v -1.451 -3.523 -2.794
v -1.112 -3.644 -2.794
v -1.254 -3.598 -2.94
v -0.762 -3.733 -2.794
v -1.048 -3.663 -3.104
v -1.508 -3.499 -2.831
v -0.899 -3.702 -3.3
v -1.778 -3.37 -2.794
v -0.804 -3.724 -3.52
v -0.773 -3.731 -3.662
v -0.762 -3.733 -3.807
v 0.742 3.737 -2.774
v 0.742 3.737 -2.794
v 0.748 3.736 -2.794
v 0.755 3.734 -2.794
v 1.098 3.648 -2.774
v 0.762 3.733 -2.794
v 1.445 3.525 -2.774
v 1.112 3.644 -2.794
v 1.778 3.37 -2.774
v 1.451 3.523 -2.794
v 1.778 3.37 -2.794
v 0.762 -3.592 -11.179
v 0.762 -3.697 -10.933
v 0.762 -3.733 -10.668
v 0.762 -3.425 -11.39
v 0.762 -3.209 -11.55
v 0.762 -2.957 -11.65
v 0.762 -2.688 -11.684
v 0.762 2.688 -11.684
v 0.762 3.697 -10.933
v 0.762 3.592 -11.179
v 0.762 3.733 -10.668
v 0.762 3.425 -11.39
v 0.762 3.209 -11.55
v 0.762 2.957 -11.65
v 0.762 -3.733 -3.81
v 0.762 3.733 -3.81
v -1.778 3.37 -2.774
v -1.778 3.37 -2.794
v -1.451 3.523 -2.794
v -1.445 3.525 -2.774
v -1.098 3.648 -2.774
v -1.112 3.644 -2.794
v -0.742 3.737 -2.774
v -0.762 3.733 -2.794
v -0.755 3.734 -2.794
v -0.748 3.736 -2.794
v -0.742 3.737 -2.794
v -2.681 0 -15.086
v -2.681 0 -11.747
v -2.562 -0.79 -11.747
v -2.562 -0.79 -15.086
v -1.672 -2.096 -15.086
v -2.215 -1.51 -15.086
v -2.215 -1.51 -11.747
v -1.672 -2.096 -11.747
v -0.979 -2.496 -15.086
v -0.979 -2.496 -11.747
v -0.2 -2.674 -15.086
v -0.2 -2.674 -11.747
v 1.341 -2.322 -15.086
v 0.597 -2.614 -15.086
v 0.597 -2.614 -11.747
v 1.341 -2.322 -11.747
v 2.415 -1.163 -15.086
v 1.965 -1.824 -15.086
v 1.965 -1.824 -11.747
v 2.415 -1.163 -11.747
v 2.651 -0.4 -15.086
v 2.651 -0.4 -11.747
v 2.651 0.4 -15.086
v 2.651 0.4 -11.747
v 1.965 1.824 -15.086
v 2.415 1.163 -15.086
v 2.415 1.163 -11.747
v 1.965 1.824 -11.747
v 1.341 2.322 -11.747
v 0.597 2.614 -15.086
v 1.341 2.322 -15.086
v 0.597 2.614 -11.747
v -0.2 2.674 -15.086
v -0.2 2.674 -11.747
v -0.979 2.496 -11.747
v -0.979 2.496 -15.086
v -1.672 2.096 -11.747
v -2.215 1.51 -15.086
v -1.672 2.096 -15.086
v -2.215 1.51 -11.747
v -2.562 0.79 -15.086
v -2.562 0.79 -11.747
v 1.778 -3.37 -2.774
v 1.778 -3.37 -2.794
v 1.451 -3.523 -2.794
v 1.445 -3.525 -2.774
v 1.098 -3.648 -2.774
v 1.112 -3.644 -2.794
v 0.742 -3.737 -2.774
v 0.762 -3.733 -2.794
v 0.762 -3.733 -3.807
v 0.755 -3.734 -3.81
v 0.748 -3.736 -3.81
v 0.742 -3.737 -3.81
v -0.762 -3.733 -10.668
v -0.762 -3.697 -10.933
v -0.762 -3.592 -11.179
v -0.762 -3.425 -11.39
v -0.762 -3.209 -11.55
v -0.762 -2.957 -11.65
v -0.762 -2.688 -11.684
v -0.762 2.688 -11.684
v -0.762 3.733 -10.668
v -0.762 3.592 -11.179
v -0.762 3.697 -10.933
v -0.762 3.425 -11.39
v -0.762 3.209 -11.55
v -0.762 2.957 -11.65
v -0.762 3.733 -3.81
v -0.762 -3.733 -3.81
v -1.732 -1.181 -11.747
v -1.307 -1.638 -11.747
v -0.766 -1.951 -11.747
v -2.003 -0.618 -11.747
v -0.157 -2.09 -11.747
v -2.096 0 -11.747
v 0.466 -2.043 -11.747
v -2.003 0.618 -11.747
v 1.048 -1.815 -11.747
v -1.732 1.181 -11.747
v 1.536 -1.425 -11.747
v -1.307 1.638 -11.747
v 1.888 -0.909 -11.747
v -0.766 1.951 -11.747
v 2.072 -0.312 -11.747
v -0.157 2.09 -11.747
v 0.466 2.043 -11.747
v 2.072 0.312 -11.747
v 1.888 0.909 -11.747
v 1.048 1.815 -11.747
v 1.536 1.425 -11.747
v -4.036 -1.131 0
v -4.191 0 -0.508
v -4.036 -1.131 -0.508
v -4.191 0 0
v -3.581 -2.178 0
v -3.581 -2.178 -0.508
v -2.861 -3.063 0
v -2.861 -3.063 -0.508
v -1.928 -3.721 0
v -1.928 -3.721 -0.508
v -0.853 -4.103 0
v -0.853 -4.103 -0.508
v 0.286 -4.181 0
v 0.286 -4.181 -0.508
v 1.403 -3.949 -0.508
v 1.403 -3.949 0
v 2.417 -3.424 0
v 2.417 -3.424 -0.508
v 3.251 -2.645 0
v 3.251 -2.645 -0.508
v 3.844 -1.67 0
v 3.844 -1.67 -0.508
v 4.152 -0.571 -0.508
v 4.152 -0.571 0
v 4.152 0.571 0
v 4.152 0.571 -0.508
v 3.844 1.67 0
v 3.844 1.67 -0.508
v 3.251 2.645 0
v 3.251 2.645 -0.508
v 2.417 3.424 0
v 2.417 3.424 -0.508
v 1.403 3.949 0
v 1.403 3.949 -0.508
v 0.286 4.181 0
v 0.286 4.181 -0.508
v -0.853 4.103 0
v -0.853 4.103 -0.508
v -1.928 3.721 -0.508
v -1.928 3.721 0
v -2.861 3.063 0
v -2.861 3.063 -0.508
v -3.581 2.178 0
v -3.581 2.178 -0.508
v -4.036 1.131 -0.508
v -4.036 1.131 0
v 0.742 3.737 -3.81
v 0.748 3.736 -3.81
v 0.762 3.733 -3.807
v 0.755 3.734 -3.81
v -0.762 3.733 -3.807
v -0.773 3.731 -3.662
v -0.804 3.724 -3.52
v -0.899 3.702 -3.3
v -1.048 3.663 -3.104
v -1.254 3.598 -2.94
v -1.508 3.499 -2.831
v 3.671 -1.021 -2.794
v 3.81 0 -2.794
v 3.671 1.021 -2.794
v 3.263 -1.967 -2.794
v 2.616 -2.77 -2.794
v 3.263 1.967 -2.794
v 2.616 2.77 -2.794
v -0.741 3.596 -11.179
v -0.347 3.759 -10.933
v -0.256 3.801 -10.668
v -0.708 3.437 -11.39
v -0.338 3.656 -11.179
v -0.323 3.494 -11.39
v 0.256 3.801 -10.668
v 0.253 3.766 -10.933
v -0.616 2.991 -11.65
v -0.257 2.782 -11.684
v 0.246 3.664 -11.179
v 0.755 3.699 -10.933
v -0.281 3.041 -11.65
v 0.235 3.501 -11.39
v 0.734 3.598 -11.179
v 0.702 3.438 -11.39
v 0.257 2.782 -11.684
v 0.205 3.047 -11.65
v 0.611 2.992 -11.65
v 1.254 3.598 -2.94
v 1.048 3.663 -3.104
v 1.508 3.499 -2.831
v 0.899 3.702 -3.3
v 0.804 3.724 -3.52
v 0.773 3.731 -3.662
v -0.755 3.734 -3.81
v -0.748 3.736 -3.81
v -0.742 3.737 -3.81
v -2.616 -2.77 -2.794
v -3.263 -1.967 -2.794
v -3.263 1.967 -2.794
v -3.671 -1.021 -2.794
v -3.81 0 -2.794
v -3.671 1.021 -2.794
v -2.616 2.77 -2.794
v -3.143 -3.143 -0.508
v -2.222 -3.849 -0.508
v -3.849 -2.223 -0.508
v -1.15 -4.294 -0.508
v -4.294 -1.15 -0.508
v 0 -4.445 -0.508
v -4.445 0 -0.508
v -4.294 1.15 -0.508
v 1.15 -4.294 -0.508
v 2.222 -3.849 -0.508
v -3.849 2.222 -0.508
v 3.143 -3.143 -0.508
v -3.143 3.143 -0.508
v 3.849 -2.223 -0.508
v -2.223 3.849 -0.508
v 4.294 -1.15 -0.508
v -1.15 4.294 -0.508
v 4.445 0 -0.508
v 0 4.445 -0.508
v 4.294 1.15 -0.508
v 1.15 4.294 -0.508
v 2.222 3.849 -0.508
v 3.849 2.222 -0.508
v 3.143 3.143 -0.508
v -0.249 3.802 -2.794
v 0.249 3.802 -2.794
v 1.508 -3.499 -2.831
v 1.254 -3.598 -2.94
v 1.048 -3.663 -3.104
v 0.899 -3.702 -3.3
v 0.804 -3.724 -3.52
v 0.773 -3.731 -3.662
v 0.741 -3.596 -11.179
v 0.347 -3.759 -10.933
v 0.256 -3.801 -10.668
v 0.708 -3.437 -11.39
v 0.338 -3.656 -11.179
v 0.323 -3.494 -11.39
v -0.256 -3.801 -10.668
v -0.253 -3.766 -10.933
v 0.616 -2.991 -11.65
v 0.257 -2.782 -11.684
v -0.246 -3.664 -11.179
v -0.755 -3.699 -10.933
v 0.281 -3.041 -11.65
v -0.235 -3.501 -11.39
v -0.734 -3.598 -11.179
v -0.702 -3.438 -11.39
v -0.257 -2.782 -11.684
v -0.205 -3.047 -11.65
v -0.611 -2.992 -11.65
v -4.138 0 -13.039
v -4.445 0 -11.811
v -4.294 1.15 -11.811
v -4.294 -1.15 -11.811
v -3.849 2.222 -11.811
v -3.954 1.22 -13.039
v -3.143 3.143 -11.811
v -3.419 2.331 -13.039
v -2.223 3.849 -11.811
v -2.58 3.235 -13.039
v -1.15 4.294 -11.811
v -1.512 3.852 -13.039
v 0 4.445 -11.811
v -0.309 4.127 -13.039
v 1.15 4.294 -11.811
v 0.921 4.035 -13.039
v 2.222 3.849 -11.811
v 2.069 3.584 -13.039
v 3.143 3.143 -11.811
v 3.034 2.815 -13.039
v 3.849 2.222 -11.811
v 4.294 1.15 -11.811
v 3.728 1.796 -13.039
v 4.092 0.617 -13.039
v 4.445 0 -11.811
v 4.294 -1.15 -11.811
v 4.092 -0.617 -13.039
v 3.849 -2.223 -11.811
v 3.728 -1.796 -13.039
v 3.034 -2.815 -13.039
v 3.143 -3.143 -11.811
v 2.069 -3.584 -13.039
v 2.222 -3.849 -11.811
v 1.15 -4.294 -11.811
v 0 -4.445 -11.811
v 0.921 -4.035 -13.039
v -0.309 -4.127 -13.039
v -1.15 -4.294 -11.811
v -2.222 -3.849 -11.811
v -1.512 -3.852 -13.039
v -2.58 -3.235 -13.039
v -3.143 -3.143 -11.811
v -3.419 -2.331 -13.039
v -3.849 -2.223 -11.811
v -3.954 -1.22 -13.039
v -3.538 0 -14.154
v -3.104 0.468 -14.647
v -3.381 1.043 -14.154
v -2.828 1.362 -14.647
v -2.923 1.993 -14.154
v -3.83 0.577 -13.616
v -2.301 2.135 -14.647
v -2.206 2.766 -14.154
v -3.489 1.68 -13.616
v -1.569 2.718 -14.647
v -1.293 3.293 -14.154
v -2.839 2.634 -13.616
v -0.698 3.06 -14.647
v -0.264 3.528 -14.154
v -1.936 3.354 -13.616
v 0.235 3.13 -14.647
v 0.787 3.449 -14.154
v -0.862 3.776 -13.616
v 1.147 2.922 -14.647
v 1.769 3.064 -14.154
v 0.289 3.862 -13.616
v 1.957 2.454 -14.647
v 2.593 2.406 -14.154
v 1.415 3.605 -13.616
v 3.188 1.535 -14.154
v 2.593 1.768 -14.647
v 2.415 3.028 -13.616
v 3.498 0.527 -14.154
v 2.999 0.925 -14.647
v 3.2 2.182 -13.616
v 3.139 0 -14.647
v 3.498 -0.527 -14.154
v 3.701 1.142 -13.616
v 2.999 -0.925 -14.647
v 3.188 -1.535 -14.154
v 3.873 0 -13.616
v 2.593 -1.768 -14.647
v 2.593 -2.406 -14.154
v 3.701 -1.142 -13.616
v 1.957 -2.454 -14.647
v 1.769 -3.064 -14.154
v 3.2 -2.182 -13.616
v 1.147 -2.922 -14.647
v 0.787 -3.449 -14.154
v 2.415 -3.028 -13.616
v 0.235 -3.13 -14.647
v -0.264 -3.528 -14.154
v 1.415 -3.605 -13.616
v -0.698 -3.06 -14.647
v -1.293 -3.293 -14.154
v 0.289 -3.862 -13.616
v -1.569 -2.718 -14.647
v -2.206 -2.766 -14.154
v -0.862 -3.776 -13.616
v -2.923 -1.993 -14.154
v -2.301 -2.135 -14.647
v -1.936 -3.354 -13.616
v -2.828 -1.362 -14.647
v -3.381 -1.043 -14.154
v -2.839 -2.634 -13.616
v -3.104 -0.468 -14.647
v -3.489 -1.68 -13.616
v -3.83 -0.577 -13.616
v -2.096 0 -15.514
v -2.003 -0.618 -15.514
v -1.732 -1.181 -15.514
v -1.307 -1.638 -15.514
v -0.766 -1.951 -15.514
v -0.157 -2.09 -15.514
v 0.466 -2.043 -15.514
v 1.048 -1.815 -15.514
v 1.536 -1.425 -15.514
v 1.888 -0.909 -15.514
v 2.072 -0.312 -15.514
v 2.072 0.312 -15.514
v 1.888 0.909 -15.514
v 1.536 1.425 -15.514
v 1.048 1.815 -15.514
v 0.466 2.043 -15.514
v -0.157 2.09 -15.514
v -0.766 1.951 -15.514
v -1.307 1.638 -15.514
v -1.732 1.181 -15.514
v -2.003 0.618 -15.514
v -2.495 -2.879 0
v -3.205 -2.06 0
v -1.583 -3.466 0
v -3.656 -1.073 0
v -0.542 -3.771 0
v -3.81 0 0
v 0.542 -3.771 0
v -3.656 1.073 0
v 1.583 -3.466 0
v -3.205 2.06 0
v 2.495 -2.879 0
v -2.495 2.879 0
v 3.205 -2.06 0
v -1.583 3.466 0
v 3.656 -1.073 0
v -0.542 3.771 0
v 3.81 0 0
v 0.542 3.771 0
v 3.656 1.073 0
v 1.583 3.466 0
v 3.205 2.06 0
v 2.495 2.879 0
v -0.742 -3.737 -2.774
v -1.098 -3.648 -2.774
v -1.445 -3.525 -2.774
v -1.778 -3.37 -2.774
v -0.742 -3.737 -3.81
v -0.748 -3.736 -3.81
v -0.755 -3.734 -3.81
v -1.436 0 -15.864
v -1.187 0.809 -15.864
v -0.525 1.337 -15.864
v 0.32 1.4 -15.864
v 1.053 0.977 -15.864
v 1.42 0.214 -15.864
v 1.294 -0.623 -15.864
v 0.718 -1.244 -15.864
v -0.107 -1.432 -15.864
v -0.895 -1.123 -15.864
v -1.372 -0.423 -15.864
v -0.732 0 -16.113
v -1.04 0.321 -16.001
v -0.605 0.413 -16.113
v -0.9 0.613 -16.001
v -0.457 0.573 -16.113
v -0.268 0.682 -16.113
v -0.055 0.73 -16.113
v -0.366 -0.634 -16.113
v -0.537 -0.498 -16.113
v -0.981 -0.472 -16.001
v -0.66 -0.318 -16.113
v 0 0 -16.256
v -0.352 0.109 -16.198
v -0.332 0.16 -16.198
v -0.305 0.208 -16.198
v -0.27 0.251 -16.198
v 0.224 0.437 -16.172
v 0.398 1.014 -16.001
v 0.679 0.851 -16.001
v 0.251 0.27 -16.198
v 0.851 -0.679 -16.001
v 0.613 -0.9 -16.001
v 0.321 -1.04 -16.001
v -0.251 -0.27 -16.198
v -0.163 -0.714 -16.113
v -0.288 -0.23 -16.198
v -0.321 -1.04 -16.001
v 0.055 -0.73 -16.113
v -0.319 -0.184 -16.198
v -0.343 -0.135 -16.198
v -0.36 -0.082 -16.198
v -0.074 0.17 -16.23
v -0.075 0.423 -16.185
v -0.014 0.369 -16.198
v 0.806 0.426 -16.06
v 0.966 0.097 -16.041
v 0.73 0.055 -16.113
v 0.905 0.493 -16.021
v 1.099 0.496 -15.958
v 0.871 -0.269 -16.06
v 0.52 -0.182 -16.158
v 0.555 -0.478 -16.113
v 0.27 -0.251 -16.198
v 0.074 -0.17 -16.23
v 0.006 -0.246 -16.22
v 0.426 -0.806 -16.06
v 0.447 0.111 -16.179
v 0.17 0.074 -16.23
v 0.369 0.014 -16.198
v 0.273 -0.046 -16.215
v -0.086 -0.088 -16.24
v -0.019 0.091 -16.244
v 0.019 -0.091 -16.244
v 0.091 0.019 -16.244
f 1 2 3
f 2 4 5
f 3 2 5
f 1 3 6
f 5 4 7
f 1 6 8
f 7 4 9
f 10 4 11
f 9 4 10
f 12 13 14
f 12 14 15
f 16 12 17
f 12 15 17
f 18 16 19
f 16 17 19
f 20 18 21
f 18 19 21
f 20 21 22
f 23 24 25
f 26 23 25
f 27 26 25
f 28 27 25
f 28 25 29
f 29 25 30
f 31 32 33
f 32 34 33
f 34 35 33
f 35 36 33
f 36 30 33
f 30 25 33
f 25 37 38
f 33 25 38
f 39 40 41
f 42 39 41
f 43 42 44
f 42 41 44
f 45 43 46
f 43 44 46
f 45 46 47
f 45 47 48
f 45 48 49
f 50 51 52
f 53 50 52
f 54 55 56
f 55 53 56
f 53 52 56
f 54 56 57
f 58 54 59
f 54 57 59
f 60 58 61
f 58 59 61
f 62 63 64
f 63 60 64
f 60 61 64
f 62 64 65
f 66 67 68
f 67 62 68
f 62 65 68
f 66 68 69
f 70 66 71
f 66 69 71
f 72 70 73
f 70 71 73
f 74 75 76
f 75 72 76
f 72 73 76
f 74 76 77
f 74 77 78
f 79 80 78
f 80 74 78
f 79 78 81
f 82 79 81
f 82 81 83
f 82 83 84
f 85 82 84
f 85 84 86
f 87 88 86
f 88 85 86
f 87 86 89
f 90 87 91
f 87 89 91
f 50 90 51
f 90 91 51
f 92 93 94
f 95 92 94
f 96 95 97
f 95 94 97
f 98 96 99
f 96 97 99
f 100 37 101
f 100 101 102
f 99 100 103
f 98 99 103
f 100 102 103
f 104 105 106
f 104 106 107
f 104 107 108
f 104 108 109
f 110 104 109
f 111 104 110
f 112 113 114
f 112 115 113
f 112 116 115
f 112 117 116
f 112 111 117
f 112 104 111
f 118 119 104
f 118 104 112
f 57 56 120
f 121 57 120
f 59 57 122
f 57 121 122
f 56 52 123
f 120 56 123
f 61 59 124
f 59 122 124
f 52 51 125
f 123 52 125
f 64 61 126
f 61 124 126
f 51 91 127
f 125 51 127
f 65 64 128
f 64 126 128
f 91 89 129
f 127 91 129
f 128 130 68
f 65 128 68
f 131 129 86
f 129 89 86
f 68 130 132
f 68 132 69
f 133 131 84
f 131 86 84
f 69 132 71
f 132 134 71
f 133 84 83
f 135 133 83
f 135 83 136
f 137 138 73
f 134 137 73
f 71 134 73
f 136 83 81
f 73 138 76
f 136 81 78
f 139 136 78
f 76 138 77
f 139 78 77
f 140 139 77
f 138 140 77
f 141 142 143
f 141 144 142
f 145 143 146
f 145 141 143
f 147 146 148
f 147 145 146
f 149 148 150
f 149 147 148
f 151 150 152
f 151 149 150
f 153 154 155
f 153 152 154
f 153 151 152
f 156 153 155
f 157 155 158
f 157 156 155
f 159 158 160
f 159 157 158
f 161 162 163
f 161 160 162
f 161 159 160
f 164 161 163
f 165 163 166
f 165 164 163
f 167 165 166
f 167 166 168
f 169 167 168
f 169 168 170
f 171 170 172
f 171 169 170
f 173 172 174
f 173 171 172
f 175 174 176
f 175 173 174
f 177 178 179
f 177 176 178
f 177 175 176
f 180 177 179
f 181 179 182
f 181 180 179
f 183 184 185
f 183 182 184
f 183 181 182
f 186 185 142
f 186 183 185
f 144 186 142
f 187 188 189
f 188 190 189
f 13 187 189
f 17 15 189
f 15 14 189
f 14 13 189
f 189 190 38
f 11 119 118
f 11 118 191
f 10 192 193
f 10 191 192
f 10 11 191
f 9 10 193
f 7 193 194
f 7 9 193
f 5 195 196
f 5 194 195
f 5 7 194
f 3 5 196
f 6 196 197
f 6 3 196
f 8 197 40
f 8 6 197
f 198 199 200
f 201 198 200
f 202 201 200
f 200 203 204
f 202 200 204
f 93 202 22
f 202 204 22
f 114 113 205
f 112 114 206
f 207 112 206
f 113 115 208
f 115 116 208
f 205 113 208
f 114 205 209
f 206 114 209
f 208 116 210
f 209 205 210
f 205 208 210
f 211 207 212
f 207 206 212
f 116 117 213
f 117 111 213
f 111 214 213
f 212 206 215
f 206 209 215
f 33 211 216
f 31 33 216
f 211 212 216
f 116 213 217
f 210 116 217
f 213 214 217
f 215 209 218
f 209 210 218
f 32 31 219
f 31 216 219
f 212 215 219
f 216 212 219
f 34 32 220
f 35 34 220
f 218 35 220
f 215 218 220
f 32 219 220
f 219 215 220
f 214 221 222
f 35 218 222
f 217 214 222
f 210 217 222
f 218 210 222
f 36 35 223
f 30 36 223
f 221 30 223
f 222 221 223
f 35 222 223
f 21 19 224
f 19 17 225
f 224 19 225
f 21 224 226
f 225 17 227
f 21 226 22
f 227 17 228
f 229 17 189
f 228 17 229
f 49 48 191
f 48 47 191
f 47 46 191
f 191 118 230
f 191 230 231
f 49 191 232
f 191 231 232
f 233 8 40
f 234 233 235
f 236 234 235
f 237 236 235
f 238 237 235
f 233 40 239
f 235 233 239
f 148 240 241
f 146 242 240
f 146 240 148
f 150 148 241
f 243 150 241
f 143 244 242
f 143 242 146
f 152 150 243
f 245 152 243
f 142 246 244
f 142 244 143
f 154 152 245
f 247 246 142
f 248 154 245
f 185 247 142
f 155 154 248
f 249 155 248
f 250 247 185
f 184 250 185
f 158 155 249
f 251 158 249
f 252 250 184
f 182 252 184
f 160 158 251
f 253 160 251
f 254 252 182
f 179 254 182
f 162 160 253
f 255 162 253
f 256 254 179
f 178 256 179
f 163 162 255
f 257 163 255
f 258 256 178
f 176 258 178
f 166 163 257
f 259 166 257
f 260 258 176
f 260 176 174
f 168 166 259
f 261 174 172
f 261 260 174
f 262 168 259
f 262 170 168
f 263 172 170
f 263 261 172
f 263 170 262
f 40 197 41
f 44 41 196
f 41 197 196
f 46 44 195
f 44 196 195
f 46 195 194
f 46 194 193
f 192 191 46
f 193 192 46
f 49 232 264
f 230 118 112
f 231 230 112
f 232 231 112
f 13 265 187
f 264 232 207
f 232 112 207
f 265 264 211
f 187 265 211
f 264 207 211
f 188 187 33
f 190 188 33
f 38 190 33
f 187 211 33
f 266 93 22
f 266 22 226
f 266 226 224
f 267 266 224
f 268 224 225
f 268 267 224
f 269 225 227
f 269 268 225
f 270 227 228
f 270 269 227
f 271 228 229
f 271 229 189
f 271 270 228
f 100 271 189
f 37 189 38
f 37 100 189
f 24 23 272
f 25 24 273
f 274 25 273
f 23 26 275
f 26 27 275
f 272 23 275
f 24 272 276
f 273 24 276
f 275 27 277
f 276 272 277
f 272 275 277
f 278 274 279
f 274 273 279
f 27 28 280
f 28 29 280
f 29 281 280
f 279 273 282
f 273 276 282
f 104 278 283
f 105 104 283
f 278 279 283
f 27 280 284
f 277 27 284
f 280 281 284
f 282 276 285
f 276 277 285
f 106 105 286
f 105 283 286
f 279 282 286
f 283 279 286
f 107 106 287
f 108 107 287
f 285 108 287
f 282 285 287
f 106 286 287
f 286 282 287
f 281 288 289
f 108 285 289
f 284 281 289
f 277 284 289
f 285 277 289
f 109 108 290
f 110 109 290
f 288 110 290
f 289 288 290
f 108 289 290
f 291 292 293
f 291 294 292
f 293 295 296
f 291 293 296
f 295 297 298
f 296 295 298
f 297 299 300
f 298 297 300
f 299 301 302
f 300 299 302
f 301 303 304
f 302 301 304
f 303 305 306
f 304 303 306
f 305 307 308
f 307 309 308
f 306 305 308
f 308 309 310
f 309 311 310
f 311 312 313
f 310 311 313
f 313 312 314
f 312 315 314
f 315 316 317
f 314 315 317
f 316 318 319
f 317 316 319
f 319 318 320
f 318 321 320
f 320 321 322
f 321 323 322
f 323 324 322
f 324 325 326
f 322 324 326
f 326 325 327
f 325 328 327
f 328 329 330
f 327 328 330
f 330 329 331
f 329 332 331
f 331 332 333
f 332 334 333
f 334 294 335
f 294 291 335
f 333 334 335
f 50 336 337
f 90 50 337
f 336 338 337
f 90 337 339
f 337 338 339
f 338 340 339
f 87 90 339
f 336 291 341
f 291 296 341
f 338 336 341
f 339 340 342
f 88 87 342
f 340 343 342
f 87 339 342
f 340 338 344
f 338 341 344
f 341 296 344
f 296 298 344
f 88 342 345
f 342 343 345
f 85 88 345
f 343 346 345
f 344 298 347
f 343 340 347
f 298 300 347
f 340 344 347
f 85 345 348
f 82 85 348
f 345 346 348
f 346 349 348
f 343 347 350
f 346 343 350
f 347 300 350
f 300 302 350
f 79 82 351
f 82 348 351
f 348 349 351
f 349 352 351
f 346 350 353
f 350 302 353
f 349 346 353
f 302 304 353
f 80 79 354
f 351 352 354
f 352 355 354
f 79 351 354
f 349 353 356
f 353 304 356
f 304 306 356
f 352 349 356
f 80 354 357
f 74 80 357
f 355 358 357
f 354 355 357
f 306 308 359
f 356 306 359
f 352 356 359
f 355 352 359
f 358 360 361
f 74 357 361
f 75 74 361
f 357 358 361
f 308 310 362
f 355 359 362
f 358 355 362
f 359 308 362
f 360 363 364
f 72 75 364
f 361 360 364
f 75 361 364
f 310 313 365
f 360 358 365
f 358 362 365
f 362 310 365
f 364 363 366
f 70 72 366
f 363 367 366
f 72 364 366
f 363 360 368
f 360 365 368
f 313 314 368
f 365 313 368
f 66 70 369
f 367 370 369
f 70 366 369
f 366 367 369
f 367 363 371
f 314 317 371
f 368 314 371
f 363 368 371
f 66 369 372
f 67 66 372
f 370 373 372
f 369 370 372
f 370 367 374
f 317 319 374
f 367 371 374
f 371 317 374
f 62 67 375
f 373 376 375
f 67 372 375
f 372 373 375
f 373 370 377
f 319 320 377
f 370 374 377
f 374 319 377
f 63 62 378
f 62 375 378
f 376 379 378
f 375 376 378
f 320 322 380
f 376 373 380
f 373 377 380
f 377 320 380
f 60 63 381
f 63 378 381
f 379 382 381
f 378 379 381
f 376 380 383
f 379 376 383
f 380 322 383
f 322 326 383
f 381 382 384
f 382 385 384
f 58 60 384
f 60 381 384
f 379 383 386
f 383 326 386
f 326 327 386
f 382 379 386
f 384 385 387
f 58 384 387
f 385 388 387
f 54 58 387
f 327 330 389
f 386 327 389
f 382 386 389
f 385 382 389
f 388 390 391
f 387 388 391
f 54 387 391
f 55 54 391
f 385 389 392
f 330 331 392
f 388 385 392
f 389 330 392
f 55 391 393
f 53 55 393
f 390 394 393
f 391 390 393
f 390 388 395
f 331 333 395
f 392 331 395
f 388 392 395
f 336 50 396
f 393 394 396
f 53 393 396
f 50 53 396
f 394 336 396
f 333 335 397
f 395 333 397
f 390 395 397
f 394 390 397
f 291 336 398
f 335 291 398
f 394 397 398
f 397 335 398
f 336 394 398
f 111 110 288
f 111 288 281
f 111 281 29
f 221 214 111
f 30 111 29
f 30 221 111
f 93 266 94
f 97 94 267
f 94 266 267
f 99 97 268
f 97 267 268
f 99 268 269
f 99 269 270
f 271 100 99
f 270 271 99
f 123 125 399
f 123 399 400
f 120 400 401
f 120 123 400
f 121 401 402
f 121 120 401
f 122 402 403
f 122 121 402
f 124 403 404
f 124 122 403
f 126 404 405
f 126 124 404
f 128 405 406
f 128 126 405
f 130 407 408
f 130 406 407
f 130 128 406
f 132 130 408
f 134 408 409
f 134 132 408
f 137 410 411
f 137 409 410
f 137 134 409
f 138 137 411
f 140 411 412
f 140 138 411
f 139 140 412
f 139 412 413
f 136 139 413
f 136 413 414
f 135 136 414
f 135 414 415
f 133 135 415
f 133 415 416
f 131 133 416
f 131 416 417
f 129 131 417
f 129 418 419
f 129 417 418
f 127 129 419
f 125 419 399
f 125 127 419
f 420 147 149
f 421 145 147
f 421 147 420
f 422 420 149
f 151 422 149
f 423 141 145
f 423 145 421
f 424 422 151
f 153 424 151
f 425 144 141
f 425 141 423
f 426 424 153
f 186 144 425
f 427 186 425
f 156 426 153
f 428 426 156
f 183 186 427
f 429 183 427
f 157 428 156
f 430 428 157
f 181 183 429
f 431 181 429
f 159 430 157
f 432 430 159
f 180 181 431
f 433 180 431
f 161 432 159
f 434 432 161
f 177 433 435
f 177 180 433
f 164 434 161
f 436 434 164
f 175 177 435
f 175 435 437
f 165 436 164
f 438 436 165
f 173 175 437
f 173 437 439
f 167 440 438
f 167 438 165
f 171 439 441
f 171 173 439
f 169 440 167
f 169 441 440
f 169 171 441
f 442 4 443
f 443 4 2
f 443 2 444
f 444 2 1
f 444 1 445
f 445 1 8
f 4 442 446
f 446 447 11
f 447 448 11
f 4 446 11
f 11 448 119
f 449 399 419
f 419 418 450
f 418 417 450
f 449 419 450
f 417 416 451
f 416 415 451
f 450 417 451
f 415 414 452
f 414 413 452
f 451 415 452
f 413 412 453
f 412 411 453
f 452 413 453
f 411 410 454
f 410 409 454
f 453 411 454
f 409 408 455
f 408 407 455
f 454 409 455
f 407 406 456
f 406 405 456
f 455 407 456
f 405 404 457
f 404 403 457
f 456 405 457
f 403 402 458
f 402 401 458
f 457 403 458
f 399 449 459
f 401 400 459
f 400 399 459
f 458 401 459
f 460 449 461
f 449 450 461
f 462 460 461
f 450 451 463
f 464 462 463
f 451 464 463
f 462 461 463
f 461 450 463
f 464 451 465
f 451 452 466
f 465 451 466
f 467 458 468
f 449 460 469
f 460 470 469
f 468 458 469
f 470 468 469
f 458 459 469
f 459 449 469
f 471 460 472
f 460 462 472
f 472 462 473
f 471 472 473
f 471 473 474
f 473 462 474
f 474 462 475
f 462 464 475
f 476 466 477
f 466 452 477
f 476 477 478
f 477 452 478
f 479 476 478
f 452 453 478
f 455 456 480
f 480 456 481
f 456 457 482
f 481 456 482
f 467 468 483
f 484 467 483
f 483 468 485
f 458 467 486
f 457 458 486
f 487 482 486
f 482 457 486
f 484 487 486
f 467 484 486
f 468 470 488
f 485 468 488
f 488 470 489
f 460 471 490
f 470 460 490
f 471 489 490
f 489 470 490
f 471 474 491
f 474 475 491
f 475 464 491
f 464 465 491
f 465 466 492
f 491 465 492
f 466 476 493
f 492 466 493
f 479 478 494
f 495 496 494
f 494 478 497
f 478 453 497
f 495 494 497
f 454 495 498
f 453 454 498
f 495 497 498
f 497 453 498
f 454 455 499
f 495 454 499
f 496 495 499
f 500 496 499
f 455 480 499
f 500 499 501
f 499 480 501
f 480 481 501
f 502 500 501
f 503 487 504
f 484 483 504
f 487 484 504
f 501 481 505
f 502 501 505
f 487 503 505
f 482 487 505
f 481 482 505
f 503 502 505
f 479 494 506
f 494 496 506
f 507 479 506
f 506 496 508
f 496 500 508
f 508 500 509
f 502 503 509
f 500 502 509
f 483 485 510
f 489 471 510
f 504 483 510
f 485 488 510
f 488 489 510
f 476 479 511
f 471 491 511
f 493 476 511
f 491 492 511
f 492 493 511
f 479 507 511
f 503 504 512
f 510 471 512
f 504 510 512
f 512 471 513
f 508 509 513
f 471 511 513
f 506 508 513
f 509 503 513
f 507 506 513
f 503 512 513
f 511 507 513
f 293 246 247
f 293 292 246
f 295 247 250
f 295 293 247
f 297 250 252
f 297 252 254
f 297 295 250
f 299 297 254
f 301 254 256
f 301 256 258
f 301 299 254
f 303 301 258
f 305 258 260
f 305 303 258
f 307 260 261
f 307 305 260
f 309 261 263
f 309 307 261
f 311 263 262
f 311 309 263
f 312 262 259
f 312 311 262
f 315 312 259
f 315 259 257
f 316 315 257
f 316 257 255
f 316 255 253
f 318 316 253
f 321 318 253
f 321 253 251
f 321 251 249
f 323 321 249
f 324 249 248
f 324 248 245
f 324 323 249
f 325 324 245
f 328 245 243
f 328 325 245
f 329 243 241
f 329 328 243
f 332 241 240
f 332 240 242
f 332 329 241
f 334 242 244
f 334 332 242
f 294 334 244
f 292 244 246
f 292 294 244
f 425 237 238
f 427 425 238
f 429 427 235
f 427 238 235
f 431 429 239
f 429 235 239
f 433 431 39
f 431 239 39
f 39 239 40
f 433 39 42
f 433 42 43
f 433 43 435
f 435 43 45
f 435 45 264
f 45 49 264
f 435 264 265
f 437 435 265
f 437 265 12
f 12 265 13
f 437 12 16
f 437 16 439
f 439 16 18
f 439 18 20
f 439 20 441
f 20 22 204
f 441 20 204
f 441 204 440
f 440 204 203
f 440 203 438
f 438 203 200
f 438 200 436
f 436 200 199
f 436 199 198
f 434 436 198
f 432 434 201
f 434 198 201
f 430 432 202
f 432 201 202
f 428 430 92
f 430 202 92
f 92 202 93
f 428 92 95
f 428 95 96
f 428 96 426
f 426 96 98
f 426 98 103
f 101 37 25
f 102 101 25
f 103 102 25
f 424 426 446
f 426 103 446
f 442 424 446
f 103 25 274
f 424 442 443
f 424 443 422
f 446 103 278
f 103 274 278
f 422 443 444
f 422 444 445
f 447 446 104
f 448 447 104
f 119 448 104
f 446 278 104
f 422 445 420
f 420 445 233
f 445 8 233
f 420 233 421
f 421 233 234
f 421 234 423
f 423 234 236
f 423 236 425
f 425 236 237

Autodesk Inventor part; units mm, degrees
ref_plane "YZ Plane" through (0, 0, 0) normal (1, 0, 0) x (0, 1, 0)
ref_plane "XZ Plane" through (0, 0, 0) normal (0, 1, 0) x (-1, 0, 0)
ref_plane "XY Plane" through (0, 0, 0) normal (0, 0, 1) x (1, 0, 0)
sketch "Sketch1" plane through (0, 0, 0) normal (0, 1, 0) x (-1, 0, 0)
  line L0 (0, 0) -> (0, -16.256)
  line L1 (0, -16.256) -> (0, -11.811)
  arc A0 (0, -16.256) -> (4.445, -11.811) centre (-0.6095, -11.2015) ccw
  line L2 (0, -16.256) -> (0, -15.3712)
  line L3 (0, -15.3712) -> (0, -14.8015)
  line L4 (4.445, -11.811) -> (4.445, -8.128)
  line L5 (0, 0) -> (0, -2.794)
  line L6 (0, -2.794) -> (4.445, -2.794)
  line L7 (4.445, -2.794) -> (4.445, -8.128)
  line L8 (0, 0) -> (0, -0.508)
  line L9 (4.445, -0.508) -> (4.445, -2.794)
  line L10 (4.445, -0.508) -> (4.191, -0.508)
  line L11 (4.191, -0.508) -> (4.191, 0)
  line L12 (4.191, 0) -> (3.81, 0)
  line L13 (3.81, 0) -> (3.81, -2.794)
  line L14 (4.191, -0.508) -> (4.191, -2.794)
  line L15 (2.0957, -15.5144) -> (2.0957, -11.7468)
  line L16 (2.681, -15.0863) -> (2.681, -11.7468)
  line L17 (2.681, -11.7468) -> (2.0957, -11.7468)
  dimension "d0" = 16.256
  dimension "d2" = 4.445
  dimension "d3" = 2.794
  dimension "d4" = 0.508
  dimension "d5" = 0.254
  dimension "d7" = 0.381
revolve "Revolution1" add sketch "Sketch1" angle 360 about axis through (0, 0, 0) along (0, 0, -1) contours L6 L7 L4 A0 L16 L17 L15 L0 | L13 L12 L11 L14 L6 | L14 L10 L9 L6
sketch "Sketch2" plane through (0, 0, -2.794) normal (0, 0, 1) x (1, 0, 0)
  line L0 (0, 0) -> (0.762, 0)
  line L1 (0.762, 0) -> (0.762, 3.733)
  circle A0 centre (0, 0) radius 3.81 projected
  line L2 (0.762, 0) -> (0.762, -3.733)
  line L3 (0, 0) -> (-0.762, 0)
  line L4 (-0.762, 0) -> (-0.762, 3.733)
  line L5 (-0.762, 0) -> (-0.762, -3.733)
  dimension "d9" = 0.762
  dimension "d10" = 0.762
extrude "Extrusion1" cut sketch "Sketch2" against normal blind 8.89 contours L3 L4 A0 L1 L0 | L0 L2 A0 L5 L3
fillet "Fillet1" radius 1.016 6 edges at (-0.762, -1.8665, -2.794) (-0.762, 1.8665, -2.794) (0.762, 1.8665, -2.794) (0.762, -1.8665, -2.794) (0, 3.81, -11.684) (0, -3.81, -11.684)
properties part number "Pencil Cab"
